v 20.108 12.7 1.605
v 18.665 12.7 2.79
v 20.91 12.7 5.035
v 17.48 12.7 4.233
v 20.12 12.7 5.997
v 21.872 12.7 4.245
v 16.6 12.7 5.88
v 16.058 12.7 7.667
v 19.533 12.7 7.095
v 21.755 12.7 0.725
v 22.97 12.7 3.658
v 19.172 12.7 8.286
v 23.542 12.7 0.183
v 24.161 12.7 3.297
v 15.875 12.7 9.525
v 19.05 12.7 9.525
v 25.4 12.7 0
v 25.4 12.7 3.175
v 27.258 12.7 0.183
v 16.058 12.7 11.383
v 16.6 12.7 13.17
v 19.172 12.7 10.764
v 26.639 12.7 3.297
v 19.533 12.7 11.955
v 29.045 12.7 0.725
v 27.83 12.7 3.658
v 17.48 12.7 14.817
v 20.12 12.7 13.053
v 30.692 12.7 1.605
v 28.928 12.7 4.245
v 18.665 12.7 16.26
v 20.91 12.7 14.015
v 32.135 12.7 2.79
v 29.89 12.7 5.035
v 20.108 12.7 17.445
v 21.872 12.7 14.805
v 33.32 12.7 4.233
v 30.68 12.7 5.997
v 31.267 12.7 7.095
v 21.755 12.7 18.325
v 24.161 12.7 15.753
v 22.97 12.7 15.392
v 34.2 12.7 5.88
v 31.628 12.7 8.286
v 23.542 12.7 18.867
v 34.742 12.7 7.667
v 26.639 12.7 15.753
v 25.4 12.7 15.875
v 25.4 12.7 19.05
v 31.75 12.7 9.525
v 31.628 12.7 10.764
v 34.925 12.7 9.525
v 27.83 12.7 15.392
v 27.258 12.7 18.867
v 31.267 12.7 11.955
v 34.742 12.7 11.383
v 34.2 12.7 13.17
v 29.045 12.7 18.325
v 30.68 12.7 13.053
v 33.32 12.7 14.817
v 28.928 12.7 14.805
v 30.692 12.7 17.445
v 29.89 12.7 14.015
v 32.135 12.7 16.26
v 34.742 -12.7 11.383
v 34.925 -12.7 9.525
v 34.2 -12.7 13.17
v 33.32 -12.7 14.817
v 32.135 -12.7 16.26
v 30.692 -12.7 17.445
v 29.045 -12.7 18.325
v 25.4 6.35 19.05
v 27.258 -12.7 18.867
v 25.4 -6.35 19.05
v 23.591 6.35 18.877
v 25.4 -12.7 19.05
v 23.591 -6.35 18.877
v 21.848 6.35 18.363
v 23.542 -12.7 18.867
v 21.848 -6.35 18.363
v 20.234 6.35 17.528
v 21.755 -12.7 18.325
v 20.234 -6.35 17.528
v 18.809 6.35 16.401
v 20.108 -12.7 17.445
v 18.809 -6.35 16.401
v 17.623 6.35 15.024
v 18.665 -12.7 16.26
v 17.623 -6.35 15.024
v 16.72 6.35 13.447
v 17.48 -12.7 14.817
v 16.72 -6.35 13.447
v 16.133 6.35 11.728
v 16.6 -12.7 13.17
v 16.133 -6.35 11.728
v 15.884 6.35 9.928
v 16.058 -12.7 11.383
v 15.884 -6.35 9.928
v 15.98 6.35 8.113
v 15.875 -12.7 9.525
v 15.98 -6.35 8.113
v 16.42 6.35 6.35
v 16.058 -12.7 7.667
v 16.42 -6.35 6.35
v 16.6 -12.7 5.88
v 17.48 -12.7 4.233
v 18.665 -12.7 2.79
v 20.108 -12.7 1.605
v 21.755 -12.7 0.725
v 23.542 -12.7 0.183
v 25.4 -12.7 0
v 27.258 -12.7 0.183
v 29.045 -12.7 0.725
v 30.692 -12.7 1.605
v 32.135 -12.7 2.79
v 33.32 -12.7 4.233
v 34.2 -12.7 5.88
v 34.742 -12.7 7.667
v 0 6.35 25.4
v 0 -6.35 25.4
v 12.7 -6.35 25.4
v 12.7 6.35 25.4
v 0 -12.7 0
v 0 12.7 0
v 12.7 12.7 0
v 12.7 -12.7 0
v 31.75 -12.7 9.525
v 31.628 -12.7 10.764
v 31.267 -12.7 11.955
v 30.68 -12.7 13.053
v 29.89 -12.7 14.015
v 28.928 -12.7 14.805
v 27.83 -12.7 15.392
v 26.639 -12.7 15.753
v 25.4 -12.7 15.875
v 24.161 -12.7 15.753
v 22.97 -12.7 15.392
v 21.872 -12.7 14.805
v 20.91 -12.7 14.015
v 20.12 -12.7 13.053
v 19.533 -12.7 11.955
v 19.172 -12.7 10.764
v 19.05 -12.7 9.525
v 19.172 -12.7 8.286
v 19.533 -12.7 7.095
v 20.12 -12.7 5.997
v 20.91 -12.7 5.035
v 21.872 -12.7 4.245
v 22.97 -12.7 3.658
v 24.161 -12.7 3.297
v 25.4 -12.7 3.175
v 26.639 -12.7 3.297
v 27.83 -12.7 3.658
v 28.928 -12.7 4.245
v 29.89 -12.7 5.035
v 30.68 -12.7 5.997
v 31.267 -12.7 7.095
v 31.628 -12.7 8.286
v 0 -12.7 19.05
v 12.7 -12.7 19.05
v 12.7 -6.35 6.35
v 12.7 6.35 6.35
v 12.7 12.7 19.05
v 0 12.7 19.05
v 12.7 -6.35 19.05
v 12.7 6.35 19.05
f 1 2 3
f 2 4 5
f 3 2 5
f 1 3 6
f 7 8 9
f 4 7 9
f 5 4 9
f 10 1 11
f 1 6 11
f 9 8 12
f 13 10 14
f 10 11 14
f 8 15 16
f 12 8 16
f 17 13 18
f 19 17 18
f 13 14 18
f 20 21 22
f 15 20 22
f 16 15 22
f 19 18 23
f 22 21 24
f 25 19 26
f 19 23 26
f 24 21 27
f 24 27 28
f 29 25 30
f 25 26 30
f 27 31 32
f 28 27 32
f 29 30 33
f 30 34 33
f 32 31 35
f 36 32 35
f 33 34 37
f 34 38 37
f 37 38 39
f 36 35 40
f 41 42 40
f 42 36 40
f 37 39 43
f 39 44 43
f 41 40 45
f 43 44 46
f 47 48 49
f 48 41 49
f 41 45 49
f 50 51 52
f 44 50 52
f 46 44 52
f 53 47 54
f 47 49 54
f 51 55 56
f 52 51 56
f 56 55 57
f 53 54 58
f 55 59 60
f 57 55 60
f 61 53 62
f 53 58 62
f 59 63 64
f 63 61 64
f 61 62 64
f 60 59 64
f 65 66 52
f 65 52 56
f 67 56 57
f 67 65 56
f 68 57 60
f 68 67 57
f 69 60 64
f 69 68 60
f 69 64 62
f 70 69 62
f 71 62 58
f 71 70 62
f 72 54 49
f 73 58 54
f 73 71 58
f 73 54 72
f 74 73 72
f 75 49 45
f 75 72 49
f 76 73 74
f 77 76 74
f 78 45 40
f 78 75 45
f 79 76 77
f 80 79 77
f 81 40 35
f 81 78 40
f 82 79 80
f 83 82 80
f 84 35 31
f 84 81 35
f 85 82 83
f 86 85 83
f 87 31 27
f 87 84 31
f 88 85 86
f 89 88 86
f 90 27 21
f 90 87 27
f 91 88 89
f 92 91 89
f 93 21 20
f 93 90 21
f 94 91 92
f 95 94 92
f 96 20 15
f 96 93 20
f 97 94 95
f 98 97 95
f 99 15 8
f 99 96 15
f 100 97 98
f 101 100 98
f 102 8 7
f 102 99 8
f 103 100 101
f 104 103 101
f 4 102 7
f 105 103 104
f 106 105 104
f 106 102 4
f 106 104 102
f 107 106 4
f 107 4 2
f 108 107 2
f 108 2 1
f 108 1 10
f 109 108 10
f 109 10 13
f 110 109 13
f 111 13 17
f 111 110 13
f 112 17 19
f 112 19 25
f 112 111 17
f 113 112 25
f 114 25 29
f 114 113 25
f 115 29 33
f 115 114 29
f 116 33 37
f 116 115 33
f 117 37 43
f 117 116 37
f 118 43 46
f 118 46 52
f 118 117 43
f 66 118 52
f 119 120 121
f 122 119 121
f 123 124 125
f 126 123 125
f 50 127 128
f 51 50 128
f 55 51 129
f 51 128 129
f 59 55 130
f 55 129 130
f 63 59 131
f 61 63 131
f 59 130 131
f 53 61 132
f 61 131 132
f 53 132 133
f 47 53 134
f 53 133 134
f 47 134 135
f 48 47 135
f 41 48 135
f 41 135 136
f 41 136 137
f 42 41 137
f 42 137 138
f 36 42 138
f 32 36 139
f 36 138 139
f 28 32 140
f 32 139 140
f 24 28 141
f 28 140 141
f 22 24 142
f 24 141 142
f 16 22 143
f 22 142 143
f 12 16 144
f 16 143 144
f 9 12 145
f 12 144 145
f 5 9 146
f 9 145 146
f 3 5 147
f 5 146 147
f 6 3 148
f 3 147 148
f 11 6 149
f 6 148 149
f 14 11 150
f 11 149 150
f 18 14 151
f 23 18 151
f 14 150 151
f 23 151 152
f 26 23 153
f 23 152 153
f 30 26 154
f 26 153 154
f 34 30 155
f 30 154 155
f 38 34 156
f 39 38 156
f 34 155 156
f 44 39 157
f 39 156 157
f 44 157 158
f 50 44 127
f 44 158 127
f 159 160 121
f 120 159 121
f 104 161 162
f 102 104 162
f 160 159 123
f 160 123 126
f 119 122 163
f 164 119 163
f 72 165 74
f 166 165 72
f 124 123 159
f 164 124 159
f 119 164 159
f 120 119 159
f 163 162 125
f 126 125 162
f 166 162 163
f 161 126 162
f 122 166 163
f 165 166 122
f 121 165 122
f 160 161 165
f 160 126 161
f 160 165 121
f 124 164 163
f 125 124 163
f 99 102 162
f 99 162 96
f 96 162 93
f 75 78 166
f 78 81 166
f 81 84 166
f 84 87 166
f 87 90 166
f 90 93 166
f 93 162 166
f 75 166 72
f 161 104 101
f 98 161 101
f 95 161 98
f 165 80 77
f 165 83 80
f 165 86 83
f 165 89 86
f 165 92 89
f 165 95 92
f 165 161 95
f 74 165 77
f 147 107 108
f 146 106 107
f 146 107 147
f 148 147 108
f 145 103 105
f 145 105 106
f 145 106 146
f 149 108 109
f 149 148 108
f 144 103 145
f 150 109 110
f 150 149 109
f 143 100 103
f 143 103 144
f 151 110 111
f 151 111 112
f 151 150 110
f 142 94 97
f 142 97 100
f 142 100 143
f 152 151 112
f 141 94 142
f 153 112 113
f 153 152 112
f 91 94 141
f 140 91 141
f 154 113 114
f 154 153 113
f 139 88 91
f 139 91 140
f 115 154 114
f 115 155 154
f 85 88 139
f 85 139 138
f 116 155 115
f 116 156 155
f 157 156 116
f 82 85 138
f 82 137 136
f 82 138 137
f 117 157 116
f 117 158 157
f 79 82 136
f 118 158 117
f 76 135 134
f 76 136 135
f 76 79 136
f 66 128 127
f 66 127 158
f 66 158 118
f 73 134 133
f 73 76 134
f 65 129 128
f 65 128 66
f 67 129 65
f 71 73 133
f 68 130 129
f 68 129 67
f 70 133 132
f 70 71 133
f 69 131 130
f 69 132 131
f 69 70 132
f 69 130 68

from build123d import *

# Parameters (mm, degrees)
F0_W     = 12.7
F0_H     = 25.4
F1_DEPTH = 12.7
F3_DEPTH = 12.7
F4_W     = 12.7
F4_H     = 12.7
F5_DEPTH = 12.7
F6_R     = 9.525
F7_DEPTH = 12.7
F8_R     = 6.35
F9_DEPTH = 25.4


with BuildPart() as f1:
    # F0 (on Front) → F1 (new body, symmetric)
    with BuildSketch(Plane.XZ):
        with Locations((6.35, 12.7)):
            Rectangle(F0_W, F0_H)
    extrude(amount=F1_DEPTH, both=True)

    # F2 (on face) → F3 (cut)
    with BuildSketch(Plane.YZ.offset(12.7)):
        Polygon((-12.7, 25.4), (-12.7, 19.05), (-6.35, 25.4), align=None)
        Polygon((12.7, 25.4), (6.35, 25.4), (12.7, 19.05), align=None)
    extrude(amount=-F3_DEPTH, mode=Mode.SUBTRACT)

    # F4 (on face) → F5 (join)
    with BuildSketch(Plane.YZ.offset(12.7)):
        with Locations((0, 12.7)):
            Rectangle(F4_W, F4_H)
    extrude(amount=F5_DEPTH)

    # F6 (on Front) → F7 (join, symmetric)
    with BuildSketch(Plane.XZ):
        with Locations((25.4, 9.525)):
            Circle(F6_R)
    extrude(amount=F7_DEPTH, both=True)

    # F8 (on face) → F9 (cut)
    with BuildSketch(Plane.XZ.offset(12.7)):
        with Locations((25.4, 9.525)):
            Circle(F8_R)
    extrude(amount=-F9_DEPTH, mode=Mode.SUBTRACT)


solid = f1.part
